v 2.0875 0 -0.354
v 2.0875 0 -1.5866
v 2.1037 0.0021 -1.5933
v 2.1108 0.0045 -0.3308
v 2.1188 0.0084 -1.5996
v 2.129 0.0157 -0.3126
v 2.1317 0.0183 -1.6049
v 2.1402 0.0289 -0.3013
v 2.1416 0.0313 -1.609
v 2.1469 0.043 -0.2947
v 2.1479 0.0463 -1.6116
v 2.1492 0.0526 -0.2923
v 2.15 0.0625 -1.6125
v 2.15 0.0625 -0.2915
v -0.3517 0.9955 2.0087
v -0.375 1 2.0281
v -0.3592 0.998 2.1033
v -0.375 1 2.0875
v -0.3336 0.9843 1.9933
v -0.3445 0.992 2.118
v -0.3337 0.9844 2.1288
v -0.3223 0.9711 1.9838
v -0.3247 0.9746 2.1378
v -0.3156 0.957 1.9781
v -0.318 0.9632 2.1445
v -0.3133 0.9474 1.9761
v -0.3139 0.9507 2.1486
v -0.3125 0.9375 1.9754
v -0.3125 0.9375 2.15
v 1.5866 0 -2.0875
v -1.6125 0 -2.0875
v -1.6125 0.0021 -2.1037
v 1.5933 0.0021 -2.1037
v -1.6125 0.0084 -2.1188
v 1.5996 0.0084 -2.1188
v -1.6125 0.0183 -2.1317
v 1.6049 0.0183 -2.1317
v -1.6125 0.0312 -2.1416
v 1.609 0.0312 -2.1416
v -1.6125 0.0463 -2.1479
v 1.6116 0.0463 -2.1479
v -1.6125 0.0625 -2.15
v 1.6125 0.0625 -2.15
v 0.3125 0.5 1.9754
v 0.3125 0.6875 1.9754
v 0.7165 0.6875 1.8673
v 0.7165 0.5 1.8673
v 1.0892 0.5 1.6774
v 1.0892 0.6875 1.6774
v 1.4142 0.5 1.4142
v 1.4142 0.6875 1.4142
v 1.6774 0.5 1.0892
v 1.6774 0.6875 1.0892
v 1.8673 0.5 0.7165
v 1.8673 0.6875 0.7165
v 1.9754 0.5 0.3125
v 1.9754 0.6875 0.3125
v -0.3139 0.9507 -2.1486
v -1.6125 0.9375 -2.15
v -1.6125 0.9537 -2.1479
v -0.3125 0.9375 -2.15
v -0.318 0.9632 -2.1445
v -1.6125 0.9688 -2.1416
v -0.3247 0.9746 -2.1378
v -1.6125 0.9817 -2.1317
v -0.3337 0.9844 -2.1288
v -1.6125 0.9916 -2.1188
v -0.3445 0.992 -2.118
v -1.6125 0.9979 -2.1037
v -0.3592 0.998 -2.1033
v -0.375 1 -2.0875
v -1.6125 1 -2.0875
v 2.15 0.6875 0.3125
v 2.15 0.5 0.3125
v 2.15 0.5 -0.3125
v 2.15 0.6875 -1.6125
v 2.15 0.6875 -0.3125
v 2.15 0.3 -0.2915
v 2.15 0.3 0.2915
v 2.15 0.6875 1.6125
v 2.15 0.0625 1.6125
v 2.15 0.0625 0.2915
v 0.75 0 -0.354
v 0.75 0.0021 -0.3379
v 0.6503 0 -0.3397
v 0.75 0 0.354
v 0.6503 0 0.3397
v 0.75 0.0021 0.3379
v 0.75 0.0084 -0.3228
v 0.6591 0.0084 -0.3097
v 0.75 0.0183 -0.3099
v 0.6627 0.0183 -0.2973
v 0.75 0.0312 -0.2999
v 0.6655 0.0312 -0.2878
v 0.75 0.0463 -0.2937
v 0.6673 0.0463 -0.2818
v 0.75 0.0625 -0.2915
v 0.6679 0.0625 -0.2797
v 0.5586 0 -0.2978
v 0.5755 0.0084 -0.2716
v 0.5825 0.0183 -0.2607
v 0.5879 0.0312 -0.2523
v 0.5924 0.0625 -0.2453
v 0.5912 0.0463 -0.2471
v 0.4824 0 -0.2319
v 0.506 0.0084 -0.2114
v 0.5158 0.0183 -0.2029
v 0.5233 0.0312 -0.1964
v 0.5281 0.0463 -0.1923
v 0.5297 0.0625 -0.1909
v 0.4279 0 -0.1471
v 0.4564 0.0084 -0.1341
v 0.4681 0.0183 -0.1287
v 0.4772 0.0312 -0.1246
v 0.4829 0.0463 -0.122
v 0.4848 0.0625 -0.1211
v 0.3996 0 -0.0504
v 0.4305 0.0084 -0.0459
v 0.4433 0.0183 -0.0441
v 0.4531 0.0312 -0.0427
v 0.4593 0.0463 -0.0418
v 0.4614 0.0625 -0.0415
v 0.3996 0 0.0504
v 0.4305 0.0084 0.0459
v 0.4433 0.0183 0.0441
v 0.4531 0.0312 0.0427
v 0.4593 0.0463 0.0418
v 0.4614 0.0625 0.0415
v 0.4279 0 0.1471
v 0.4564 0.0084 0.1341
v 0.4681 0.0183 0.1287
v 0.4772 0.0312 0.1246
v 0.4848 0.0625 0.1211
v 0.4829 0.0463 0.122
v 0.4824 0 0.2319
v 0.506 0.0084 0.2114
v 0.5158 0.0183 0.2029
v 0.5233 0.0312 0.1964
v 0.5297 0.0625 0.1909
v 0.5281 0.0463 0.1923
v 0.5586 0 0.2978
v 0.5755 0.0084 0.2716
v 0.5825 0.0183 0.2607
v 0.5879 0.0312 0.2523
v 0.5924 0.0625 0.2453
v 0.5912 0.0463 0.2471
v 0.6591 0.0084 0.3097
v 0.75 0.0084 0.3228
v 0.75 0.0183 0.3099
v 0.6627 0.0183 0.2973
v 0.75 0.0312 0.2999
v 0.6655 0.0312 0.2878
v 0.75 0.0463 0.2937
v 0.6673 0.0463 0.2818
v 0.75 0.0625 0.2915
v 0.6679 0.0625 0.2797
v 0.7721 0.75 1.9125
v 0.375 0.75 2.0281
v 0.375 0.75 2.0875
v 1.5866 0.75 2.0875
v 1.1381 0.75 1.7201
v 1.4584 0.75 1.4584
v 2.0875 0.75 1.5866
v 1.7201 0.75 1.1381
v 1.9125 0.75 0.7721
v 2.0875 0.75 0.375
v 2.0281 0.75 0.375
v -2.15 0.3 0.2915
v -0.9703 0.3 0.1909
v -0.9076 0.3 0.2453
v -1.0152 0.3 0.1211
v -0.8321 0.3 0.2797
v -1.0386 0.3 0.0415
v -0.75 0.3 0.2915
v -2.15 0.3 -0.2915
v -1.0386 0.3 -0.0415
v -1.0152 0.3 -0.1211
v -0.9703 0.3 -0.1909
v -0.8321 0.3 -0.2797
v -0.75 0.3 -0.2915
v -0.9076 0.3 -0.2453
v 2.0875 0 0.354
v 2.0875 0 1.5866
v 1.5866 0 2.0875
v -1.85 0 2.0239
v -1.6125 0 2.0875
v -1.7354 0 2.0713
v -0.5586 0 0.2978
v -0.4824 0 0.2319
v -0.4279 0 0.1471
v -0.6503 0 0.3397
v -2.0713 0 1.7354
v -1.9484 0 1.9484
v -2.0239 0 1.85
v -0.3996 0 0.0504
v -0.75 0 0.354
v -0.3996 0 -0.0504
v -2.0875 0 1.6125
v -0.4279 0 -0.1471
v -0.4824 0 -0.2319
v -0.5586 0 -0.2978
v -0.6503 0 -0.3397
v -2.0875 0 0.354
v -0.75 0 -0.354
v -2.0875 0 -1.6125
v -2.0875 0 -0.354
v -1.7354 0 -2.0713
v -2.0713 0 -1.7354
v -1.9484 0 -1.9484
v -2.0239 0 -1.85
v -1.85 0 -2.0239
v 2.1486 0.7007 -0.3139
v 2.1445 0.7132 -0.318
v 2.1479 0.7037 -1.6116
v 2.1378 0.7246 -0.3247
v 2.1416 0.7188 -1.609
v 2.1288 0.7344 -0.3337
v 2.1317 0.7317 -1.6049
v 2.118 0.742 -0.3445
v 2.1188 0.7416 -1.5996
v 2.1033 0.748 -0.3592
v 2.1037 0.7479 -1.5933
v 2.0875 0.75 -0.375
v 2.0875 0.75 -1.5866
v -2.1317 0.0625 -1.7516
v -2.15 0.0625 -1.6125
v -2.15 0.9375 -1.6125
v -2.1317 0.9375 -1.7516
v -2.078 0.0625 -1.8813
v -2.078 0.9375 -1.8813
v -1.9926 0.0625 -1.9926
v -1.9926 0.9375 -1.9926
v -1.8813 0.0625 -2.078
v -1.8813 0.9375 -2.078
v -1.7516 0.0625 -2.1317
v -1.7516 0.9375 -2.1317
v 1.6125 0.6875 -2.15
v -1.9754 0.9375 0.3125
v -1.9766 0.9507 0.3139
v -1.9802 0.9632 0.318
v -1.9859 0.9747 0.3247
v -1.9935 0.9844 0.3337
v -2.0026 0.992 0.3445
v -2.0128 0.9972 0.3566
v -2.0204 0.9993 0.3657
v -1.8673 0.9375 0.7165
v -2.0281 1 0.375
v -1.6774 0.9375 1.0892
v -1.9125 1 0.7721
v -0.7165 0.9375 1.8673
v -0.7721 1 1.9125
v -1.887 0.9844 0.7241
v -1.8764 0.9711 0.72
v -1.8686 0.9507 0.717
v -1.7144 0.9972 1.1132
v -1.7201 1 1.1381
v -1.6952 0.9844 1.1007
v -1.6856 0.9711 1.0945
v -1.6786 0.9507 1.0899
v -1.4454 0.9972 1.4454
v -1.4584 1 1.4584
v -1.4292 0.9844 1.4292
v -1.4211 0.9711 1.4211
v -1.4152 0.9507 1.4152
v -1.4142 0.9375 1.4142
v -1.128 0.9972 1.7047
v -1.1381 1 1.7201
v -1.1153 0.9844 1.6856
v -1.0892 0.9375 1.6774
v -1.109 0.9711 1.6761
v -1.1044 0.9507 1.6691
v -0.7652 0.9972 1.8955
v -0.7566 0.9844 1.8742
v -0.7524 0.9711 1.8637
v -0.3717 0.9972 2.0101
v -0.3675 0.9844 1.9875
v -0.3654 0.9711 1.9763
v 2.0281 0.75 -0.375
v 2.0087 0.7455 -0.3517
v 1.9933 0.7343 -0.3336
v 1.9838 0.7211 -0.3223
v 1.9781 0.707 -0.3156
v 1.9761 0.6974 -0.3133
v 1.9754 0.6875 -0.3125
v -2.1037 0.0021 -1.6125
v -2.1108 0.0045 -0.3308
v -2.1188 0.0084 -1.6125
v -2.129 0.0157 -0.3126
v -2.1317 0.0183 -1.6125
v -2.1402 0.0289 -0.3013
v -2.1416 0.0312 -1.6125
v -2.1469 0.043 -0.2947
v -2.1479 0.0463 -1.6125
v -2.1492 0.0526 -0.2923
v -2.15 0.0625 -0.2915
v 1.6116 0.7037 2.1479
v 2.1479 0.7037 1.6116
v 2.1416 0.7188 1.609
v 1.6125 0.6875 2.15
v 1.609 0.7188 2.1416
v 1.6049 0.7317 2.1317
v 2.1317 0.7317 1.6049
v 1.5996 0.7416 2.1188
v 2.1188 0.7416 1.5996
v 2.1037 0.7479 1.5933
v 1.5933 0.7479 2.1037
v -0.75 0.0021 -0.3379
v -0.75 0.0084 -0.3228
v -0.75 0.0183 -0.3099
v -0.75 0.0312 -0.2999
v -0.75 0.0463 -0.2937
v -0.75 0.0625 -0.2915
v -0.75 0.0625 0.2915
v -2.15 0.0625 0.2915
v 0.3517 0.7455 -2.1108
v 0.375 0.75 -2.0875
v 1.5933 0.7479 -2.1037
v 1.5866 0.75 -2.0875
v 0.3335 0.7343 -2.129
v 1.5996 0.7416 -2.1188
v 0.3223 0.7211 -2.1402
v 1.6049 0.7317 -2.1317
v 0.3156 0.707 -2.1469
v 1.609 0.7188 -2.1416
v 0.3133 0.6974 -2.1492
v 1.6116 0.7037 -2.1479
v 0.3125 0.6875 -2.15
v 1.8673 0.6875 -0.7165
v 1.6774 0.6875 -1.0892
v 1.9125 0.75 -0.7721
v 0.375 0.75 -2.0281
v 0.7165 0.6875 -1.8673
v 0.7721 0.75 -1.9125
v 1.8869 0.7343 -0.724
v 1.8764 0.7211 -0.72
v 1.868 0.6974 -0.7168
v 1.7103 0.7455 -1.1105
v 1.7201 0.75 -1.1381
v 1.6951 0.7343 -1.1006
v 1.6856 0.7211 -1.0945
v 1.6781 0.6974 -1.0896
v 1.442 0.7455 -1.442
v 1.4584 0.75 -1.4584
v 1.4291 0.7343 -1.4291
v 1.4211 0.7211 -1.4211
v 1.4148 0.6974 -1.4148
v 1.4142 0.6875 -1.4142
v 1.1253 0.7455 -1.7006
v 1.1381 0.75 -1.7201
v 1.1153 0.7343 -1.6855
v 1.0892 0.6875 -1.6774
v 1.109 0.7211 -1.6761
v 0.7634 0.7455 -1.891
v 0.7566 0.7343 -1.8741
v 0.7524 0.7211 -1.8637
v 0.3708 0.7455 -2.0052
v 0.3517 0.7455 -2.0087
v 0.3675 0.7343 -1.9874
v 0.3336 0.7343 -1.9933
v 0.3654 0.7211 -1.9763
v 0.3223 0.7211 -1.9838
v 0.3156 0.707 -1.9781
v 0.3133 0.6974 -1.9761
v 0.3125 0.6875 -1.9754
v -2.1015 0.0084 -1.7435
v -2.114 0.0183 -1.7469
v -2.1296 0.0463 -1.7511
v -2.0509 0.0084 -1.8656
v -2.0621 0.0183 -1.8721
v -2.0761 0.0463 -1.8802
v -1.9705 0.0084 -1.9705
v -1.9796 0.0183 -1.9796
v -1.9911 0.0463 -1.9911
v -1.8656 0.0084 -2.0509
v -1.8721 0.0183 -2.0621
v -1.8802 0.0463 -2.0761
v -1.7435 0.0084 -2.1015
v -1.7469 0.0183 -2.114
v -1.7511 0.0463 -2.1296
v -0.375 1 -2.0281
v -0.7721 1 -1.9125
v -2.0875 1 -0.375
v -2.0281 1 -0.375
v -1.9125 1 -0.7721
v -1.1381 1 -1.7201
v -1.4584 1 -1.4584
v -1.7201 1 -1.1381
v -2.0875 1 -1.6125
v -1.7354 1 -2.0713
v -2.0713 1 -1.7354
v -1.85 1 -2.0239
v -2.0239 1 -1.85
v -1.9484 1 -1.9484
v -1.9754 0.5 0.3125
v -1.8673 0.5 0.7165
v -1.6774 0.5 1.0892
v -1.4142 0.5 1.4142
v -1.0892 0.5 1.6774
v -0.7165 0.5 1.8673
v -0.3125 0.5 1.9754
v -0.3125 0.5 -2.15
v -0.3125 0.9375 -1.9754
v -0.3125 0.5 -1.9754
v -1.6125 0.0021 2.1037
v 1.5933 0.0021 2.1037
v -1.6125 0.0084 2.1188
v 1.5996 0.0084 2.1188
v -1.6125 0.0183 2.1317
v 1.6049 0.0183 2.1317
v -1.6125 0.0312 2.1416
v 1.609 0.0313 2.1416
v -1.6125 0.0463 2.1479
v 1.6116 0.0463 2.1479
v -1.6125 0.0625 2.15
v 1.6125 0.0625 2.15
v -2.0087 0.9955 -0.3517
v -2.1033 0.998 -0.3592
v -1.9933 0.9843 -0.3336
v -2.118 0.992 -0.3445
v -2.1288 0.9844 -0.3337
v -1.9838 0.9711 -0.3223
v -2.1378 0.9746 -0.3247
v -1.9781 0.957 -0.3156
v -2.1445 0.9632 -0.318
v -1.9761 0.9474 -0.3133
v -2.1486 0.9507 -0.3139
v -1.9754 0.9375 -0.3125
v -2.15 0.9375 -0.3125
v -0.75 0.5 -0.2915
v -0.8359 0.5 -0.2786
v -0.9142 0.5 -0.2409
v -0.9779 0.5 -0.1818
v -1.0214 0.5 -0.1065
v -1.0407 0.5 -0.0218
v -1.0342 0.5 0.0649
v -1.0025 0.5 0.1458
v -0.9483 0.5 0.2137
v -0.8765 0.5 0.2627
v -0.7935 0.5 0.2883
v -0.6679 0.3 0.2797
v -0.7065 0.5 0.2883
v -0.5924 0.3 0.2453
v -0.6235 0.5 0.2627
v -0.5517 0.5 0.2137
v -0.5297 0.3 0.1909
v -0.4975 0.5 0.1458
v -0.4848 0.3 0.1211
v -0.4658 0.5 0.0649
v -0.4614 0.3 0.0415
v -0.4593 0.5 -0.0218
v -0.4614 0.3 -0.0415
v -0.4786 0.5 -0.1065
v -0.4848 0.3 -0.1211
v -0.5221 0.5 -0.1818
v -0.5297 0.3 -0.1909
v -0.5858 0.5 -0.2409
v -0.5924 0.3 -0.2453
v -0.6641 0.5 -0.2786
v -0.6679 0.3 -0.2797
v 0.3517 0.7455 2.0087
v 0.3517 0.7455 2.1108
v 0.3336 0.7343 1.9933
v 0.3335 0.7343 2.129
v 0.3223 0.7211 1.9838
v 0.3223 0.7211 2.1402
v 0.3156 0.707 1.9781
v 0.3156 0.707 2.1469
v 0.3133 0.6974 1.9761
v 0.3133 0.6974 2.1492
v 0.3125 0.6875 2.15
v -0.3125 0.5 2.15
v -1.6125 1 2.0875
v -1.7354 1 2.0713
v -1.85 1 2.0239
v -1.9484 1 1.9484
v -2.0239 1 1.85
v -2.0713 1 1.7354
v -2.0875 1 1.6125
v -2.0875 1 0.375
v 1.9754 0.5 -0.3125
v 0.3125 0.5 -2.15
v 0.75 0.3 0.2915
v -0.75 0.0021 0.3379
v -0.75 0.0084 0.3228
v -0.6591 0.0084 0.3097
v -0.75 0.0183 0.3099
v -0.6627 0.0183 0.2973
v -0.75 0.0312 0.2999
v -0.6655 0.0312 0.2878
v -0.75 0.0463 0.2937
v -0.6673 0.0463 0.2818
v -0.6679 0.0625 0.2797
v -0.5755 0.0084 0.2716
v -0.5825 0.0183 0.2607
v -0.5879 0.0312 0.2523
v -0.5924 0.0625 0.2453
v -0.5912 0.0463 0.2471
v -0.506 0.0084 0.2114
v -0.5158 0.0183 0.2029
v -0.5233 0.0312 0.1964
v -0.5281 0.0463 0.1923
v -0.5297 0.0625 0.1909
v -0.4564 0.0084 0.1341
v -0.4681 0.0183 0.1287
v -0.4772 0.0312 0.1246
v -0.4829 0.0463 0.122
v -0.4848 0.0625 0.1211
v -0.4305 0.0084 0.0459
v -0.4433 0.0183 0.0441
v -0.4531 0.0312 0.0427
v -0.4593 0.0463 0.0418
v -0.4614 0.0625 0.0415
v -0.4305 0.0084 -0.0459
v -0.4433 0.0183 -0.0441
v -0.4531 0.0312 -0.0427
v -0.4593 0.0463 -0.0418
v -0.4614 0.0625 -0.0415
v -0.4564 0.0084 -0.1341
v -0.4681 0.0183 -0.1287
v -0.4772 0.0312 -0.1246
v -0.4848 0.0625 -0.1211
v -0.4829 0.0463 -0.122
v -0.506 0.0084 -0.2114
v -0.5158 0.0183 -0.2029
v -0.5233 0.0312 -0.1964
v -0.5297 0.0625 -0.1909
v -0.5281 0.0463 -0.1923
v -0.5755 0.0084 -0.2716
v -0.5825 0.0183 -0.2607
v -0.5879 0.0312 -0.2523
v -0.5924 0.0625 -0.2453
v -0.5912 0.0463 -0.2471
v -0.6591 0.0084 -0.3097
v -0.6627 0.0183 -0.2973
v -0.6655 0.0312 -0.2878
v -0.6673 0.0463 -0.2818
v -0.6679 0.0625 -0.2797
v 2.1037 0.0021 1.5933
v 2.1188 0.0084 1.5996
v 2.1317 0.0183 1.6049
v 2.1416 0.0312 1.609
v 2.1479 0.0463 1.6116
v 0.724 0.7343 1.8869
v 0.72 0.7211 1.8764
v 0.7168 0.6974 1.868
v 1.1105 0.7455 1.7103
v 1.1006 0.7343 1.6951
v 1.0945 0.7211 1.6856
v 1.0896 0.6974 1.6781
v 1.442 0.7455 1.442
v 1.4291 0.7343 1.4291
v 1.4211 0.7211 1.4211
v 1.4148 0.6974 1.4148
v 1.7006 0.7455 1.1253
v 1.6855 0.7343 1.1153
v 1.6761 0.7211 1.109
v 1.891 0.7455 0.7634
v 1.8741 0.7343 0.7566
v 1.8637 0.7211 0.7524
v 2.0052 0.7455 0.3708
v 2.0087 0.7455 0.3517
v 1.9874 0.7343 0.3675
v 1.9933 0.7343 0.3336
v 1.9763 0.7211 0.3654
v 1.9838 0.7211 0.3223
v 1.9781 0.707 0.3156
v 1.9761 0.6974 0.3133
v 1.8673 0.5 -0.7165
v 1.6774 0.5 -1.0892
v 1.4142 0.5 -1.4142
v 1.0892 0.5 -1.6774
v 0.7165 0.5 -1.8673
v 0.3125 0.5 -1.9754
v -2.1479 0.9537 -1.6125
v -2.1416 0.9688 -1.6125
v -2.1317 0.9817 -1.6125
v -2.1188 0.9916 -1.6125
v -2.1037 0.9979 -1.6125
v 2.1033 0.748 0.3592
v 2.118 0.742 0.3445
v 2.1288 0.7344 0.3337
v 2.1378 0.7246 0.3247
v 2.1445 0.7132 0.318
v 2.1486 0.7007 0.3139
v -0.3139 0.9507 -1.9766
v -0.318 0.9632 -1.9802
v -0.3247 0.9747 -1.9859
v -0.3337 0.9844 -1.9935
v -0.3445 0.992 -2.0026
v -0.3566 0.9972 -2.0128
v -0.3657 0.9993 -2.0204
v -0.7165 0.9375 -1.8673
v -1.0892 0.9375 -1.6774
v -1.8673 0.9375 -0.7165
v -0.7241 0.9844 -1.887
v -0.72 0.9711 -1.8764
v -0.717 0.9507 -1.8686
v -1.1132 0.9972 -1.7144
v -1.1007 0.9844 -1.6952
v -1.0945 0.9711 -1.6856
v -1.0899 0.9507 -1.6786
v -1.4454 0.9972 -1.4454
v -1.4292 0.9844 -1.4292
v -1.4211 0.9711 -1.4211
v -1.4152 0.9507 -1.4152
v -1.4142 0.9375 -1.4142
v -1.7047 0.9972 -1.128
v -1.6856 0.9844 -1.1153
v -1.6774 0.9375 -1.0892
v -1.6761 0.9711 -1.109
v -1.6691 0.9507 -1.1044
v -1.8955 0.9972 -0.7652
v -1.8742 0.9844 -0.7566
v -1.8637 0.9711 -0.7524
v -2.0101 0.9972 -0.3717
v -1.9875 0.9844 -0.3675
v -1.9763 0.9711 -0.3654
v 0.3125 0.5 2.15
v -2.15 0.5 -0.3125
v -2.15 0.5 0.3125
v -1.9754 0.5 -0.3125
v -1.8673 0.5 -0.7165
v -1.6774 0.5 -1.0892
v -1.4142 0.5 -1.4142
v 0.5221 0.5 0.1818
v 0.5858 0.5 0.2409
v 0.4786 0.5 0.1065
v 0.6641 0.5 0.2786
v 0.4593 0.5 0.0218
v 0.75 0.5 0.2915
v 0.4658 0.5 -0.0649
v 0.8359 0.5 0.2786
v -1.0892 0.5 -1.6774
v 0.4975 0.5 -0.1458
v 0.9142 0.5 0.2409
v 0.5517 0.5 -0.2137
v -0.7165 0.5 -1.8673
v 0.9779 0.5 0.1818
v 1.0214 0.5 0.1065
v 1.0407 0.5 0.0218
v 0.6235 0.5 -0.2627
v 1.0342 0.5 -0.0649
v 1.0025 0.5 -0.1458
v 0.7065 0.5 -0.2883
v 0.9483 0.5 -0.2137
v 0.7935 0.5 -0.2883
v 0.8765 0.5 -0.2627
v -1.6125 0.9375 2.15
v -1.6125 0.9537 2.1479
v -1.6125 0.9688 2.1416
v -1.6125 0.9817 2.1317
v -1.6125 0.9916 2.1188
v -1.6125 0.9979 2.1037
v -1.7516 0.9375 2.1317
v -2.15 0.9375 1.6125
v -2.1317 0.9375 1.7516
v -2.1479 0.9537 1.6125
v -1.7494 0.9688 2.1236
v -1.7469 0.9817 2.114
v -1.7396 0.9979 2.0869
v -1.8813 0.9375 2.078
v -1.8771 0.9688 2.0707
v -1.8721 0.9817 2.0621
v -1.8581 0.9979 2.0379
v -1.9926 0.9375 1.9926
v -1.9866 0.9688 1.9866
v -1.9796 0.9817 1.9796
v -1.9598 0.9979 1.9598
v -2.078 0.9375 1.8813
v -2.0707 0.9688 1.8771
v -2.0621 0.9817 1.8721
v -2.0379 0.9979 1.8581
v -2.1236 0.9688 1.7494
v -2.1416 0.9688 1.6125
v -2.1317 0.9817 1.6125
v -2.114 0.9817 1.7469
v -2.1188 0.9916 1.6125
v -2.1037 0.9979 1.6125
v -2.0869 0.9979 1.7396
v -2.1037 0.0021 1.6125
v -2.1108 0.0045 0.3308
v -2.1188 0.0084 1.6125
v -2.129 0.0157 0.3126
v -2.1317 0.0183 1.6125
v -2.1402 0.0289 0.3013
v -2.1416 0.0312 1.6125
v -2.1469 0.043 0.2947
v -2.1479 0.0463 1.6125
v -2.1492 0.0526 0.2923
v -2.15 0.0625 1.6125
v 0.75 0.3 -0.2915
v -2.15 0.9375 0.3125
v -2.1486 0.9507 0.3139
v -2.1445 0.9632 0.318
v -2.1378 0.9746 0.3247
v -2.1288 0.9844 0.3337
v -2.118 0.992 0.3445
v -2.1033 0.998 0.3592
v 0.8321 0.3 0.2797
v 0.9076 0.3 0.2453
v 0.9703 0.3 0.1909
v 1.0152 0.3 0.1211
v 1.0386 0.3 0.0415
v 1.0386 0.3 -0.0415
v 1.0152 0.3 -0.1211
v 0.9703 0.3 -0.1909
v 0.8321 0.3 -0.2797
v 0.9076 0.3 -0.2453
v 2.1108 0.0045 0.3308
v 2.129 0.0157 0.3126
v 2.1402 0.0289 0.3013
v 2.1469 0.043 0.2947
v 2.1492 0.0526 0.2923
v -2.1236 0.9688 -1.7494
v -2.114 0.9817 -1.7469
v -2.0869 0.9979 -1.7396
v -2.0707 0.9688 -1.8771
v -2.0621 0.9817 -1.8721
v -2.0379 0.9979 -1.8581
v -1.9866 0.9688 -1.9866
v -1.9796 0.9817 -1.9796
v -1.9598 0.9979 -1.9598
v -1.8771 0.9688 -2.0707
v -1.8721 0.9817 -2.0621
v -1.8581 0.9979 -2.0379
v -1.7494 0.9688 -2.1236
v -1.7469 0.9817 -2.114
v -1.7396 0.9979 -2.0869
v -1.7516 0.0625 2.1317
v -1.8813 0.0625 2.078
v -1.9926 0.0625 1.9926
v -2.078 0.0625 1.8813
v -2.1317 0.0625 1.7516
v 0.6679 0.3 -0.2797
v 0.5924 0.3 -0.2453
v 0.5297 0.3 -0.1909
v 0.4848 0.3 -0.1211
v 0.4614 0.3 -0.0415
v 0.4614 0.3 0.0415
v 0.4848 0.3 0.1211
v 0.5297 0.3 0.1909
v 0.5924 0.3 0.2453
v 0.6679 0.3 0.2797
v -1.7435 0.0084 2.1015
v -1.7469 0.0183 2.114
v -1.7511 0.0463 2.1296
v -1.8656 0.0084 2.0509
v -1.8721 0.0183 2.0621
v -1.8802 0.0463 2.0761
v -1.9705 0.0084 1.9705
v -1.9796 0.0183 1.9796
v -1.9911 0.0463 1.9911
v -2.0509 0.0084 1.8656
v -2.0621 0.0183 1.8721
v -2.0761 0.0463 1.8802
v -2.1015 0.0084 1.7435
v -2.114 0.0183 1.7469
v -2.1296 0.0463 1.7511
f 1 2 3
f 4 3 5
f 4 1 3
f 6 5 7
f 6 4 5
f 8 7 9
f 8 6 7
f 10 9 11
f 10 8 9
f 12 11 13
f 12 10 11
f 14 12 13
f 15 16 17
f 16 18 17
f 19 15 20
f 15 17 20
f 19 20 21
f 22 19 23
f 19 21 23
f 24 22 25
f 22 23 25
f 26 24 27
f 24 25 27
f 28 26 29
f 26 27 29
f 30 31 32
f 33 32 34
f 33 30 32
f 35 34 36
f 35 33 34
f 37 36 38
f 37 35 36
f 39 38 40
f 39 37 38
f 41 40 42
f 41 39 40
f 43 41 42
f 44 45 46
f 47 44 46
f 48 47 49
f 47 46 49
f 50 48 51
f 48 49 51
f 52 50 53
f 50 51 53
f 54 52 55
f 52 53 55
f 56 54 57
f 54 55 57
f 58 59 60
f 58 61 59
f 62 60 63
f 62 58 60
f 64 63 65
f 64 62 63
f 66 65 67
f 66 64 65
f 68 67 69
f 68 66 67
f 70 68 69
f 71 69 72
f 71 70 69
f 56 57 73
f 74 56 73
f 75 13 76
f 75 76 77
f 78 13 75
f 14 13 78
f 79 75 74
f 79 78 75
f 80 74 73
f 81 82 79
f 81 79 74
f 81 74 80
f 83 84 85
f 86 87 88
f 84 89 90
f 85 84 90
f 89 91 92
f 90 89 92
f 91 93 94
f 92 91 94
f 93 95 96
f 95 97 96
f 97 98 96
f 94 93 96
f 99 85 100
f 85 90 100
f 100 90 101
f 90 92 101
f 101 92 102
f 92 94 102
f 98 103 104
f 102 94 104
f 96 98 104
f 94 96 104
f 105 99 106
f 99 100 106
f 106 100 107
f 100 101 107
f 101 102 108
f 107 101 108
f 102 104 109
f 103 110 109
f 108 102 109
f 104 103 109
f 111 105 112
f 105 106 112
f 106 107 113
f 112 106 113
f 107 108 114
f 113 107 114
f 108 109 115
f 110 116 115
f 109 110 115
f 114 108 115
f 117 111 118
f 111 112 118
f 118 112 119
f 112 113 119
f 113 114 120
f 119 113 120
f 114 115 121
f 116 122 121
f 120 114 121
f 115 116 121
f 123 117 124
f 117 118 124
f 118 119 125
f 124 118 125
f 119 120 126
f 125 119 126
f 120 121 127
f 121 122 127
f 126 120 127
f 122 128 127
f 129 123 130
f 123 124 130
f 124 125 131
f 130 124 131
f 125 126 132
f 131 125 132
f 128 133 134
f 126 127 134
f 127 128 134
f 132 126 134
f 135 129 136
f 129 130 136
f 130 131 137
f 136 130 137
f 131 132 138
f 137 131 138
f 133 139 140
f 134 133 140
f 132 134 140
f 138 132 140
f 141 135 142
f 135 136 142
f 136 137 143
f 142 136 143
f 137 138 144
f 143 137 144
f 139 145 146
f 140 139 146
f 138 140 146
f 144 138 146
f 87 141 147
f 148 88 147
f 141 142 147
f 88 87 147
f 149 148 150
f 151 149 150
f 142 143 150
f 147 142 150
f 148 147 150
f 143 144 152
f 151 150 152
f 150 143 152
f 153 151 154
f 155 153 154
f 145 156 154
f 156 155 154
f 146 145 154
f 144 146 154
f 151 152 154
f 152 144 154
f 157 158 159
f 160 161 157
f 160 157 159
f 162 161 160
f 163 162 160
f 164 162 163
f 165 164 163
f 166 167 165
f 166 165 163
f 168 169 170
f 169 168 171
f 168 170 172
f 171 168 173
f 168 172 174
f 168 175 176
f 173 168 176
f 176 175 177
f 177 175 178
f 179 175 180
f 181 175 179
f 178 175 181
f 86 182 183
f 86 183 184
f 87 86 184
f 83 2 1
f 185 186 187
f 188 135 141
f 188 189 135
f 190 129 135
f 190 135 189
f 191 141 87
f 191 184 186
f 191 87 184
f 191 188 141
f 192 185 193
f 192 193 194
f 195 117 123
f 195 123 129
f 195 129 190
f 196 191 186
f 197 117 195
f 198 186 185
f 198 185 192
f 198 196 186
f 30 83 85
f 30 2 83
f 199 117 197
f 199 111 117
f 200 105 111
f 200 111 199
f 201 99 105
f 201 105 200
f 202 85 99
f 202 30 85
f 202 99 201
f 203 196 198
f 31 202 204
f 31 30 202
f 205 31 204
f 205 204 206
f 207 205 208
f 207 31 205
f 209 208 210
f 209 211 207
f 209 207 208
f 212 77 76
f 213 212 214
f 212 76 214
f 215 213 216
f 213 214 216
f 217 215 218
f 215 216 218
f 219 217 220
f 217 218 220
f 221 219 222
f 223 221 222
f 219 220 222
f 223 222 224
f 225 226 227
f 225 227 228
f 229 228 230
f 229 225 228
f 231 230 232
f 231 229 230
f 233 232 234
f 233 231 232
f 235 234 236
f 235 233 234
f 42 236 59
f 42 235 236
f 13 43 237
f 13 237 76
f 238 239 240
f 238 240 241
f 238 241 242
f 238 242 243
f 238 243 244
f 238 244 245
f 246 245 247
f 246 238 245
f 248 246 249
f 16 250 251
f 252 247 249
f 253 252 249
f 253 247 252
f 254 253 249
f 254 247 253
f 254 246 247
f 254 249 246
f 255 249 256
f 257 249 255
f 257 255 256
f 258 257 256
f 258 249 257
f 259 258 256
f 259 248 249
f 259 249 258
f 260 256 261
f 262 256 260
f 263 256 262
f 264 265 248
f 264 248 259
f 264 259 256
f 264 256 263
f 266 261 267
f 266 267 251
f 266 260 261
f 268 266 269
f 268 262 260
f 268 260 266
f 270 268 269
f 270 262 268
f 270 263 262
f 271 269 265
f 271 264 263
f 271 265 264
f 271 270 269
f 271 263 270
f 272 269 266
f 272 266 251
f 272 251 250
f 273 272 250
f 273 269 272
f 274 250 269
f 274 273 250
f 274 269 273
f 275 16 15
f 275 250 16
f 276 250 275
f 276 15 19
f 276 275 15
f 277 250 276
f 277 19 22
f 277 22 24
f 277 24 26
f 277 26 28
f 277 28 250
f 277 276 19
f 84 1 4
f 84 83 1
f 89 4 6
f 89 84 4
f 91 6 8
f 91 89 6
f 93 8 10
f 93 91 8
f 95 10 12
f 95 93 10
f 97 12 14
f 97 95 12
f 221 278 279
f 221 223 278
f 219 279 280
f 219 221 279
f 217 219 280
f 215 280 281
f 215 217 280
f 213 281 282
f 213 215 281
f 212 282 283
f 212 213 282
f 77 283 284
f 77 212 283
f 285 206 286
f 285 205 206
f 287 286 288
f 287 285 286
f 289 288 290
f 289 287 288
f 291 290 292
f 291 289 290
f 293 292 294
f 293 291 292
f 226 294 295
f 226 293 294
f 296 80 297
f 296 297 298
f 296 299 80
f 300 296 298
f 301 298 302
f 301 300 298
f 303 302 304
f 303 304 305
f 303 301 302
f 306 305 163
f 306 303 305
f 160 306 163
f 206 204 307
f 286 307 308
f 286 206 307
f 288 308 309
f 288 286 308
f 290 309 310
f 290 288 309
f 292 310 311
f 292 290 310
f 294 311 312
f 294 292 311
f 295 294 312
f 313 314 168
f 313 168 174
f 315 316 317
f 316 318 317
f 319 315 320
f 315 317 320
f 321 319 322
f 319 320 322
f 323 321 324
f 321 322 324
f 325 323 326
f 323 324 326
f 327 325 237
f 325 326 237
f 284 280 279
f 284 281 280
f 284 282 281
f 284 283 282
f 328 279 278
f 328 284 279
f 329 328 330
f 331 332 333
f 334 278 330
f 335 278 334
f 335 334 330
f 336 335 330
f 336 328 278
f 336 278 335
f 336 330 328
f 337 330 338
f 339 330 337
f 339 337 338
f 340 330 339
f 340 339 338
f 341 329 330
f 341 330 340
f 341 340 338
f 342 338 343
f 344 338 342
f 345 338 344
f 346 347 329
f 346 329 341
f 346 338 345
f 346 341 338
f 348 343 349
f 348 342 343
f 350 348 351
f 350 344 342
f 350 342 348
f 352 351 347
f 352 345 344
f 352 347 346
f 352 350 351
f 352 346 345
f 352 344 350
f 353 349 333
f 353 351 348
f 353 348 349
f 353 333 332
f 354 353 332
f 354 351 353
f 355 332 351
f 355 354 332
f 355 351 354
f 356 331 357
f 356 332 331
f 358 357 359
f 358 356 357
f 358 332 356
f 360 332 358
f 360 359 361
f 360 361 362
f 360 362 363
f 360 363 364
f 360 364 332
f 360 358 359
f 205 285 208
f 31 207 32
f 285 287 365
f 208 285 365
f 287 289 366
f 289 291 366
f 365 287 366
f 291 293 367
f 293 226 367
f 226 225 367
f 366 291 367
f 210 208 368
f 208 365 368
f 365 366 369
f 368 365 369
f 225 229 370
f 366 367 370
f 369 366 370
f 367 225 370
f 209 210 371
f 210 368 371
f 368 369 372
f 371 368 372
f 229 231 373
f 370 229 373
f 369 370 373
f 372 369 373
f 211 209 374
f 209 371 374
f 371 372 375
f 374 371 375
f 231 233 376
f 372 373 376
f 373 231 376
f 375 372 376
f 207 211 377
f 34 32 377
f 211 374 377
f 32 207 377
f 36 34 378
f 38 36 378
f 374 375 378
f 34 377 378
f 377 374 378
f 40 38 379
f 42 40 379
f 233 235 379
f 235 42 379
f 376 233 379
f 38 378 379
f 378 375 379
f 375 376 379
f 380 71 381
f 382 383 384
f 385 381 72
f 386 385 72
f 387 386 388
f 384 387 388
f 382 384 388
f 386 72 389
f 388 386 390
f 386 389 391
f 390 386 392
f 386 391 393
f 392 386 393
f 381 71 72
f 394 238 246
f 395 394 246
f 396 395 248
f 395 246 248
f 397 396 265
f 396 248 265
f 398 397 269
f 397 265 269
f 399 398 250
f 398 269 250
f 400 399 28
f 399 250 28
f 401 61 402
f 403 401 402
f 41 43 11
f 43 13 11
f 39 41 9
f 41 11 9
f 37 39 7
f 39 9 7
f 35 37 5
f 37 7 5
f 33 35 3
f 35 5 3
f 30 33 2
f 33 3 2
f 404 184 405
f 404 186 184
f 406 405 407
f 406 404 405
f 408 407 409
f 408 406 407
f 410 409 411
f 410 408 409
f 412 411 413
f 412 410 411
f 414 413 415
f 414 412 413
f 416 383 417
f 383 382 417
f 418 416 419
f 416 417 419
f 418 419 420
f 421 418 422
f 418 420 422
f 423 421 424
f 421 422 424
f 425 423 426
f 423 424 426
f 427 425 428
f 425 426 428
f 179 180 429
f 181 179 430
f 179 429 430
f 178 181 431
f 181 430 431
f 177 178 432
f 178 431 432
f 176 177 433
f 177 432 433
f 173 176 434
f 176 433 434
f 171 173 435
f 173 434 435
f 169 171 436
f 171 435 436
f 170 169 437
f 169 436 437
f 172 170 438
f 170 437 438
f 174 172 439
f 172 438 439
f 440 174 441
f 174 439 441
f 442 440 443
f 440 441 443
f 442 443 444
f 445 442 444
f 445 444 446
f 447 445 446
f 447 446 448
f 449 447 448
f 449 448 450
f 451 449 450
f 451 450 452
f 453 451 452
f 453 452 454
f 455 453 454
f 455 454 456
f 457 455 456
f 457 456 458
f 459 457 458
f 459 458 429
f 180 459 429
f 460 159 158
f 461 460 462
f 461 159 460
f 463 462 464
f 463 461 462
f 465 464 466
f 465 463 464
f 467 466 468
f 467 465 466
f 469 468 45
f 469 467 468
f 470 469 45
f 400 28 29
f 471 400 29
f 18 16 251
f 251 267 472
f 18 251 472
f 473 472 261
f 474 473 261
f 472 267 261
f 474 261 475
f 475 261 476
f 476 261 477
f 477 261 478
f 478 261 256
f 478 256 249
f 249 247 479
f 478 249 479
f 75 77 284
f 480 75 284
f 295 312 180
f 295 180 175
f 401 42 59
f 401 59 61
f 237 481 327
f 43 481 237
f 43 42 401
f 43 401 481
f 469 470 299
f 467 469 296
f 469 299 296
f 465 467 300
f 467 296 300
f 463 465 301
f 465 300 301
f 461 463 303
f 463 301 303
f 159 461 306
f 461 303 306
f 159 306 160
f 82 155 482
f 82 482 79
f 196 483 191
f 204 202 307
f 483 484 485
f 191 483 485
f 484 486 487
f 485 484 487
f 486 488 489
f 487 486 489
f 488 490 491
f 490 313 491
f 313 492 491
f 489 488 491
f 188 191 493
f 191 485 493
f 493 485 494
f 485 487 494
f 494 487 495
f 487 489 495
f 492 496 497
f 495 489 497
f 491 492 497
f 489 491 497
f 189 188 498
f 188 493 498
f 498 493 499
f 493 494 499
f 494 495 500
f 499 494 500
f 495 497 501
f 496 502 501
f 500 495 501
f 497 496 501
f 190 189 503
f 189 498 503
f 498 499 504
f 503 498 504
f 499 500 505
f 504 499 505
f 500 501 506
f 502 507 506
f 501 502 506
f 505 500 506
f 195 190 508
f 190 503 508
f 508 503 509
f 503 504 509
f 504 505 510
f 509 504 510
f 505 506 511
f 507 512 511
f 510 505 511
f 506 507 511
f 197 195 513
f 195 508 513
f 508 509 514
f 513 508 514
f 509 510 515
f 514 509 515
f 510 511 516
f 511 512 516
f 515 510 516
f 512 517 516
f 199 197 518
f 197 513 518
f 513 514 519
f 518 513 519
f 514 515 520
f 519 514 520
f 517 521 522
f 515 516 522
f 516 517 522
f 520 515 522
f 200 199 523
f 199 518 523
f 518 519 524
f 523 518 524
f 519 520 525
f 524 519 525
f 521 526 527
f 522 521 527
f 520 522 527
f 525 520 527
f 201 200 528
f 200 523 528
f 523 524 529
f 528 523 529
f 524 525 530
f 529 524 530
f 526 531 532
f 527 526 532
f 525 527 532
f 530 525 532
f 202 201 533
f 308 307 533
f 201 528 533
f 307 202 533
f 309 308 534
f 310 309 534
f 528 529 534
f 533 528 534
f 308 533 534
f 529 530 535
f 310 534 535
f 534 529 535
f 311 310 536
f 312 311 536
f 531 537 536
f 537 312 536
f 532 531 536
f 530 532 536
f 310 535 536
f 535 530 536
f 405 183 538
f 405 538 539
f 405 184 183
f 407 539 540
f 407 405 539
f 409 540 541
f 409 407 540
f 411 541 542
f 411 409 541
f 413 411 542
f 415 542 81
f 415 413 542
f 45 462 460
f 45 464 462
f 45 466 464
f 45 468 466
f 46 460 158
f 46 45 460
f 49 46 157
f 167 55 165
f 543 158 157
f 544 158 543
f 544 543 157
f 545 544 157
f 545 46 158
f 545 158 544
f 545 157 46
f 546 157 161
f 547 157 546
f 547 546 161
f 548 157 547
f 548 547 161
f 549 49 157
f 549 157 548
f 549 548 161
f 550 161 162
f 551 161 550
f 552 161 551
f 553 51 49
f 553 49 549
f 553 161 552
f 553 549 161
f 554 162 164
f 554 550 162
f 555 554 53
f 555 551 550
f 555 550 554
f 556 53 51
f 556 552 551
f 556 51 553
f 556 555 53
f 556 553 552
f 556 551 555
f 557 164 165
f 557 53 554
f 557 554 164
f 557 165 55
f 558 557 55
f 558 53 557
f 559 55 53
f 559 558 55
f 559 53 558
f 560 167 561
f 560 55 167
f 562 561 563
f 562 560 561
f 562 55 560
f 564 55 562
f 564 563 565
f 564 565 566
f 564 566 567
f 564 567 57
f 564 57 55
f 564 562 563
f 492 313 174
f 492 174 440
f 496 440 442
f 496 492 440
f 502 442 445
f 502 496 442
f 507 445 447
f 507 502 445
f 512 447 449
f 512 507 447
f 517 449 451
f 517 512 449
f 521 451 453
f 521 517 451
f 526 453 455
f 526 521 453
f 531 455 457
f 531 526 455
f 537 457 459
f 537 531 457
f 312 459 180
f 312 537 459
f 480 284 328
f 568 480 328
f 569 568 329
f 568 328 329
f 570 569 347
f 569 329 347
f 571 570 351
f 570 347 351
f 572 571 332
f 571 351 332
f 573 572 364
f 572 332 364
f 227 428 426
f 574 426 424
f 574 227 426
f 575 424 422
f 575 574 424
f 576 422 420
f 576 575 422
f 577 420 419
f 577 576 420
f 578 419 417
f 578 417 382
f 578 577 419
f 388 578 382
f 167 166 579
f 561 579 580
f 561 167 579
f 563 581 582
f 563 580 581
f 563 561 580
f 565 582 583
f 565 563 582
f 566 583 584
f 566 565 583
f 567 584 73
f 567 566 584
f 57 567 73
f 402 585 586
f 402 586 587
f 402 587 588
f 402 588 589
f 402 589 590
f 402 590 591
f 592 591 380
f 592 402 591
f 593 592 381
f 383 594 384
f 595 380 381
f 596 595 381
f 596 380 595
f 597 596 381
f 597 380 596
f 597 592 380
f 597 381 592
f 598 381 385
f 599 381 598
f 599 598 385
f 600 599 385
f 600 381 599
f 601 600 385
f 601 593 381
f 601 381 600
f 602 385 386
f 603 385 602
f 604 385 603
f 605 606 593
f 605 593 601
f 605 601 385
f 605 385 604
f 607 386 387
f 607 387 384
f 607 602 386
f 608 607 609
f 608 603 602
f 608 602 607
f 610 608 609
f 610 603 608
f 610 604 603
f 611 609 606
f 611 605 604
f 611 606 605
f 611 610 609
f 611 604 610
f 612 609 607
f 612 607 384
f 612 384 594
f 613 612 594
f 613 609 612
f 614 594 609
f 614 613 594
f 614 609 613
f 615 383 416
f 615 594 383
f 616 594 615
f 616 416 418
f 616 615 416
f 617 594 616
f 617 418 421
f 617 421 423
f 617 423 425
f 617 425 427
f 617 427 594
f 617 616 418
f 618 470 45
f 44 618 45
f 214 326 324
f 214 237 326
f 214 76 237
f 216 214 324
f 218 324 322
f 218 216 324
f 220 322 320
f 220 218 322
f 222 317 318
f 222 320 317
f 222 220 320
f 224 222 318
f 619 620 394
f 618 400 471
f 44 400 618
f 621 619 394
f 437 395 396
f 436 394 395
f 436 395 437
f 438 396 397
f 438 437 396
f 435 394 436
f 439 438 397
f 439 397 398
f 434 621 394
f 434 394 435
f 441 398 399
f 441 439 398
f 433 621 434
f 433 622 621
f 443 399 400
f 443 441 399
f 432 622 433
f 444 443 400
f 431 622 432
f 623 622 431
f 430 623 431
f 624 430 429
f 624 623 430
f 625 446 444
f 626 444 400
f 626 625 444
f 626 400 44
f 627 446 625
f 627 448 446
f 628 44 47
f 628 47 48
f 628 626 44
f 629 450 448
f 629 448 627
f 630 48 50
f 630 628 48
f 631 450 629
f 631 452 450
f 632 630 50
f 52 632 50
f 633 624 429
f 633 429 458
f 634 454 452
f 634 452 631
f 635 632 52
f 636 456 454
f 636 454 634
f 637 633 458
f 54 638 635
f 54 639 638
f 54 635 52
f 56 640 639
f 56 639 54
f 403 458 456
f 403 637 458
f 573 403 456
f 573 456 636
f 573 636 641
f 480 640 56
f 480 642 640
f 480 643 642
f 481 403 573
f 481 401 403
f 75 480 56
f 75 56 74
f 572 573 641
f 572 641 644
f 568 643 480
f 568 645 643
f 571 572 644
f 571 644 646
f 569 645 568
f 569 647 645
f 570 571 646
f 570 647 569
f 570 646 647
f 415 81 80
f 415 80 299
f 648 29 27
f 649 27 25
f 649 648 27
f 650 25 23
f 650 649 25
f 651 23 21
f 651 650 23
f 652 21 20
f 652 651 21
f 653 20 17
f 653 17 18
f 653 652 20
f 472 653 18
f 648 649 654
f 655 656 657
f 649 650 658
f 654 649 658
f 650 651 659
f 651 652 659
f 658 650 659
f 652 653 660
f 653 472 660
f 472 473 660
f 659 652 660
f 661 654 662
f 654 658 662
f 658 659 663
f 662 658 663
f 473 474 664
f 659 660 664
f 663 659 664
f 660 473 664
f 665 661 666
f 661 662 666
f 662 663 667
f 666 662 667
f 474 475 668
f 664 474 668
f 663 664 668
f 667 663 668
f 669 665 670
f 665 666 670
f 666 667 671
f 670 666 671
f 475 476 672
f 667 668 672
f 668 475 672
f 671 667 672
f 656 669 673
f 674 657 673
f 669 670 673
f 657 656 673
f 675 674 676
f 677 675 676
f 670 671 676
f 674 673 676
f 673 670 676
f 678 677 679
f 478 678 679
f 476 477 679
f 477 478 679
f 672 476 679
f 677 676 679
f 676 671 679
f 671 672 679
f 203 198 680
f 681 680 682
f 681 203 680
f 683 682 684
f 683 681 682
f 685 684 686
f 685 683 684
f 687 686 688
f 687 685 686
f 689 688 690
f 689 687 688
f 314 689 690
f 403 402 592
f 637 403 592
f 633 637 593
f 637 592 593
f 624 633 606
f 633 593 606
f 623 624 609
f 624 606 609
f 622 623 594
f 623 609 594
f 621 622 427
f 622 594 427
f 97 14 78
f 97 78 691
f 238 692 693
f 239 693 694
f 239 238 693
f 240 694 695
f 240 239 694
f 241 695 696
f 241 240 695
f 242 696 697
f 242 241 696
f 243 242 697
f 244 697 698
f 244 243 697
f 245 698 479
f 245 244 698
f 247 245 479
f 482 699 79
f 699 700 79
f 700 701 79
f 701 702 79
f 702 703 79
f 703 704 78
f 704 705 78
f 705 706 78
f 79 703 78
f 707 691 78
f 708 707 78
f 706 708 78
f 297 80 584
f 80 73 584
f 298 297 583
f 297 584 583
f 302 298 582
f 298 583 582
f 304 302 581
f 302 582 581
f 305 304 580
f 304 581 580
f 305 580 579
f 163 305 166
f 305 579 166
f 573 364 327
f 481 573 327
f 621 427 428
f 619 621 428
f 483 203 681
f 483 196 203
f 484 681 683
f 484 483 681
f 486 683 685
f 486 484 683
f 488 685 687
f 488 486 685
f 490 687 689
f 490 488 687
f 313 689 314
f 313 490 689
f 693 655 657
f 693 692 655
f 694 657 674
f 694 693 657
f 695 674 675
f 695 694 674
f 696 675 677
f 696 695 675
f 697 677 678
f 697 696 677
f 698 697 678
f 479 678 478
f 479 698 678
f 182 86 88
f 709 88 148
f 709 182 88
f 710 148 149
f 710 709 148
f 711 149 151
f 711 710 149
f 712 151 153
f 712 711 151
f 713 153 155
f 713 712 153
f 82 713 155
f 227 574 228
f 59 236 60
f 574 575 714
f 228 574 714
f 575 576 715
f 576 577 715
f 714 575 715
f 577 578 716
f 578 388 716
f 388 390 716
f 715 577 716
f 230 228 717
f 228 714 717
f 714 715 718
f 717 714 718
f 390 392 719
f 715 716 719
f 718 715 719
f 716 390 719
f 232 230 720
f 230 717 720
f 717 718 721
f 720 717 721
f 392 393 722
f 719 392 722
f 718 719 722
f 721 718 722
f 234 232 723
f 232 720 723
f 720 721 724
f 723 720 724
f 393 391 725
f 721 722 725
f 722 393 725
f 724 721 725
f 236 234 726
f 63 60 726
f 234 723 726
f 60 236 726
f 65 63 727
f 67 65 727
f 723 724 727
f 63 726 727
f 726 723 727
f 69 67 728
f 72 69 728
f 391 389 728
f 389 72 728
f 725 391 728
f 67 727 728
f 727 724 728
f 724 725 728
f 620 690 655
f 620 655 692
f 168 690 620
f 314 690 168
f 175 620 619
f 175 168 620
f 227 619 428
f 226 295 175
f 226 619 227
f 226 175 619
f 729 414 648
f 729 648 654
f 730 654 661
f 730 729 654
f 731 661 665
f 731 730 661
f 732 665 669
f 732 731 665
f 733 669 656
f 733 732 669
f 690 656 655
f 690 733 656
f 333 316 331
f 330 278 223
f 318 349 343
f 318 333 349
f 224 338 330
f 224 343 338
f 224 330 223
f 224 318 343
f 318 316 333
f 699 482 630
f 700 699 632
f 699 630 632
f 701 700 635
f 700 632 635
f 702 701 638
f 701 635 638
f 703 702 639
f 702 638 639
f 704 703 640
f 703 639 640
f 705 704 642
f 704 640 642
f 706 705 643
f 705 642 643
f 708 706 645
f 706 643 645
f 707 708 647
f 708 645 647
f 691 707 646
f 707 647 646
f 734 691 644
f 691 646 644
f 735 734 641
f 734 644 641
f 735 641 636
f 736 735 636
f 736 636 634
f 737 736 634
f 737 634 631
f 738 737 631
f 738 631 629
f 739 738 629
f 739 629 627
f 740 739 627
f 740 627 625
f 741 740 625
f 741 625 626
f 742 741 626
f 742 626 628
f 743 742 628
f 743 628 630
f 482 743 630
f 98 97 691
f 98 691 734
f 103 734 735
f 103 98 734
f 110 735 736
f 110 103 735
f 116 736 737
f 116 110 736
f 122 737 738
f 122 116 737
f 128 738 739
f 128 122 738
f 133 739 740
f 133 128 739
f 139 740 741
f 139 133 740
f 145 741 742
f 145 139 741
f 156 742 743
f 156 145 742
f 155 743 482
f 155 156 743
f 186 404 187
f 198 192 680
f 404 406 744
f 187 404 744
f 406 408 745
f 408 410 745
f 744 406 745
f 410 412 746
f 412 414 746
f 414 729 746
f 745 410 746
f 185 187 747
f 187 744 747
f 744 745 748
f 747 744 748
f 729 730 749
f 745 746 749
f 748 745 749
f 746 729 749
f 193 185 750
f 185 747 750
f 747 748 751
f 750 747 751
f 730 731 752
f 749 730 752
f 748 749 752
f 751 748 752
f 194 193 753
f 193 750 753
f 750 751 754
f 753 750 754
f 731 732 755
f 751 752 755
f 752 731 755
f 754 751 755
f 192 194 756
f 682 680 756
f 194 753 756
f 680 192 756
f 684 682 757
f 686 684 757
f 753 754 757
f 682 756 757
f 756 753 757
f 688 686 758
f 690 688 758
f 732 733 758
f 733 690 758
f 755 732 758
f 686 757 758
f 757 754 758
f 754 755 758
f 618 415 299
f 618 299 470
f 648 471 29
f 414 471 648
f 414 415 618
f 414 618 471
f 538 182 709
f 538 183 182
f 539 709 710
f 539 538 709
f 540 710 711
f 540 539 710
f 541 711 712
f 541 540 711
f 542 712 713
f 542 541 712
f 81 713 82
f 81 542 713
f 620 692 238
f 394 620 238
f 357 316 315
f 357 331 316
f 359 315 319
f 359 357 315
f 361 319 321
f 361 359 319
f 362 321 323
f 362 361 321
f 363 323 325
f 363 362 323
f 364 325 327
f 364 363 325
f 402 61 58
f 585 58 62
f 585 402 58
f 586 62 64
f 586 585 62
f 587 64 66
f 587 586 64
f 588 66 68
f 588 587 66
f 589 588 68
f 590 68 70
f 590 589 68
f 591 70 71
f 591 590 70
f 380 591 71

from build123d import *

# Parameters (mm, degrees)
SALIENTE_EXTRUIR1_DEPTH = 1
CORTAR_EXTRUIR1_DEPTH   = 0.5
CROQUIS4_W              = 2.15
CROQUIS4_H              = 4.3
CORTAR_EXTRUIR2_DEPTH   = 0.25
CORTAR_EXTRUIR3_DEPTH   = 0.3
CROQUIS6_R              = 0.291547595
CORTAR_EXTRUIR4_DEPTH   = 4.081395788
REDONDEO1_R             = 0.0625


with BuildPart() as part:
    # Croquis2 → Saliente-Extruir1 (new body)
    with BuildSketch(Plane(origin=(0, 0, 0), x_dir=(1, 0, 0), z_dir=(0, 1, 0))):
        with BuildLine():
            Line((1.6125, 2.15), (2.15, 1.6125))
            Line((2.15, 1.6125), (2.15, -1.6125))
            Line((2.15, -1.6125), (1.6125, -2.15))
            Line((1.6125, -2.15), (-1.6125, -2.15))
            ThreePointArc((-1.6125, -2.15), (-1.992569895, -1.992569895), (-2.15, -1.6125))
            Line((-2.15, -1.6125), (-2.15, 1.6125))
            ThreePointArc((-2.15, 1.6125), (-1.992569895, 1.992569895), (-1.6125, 2.15))
            Line((-1.6125, 2.15), (1.6125, 2.15))
        make_face()
    extrude(amount=SALIENTE_EXTRUIR1_DEPTH)

    # Croquis3 → Cortar-Extruir1 (cut)
    with BuildSketch(Plane(origin=(0, 1, 0), x_dir=(1, 0, 0), z_dir=(0, 1, 0))):
        with BuildLine():
            ThreePointArc((-0.3125, 1.975435079), (-1.414213562, 1.414213562), (-1.975435079, 0.3125))
            Line((-1.975435079, 0.3125), (-2.15, 0.3125))
            Line((-2.15, 0.3125), (-2.15, -0.3125))
            Line((-2.15, -0.3125), (-1.975435079, -0.3125))
            ThreePointArc((-1.975435079, -0.3125), (-1.414213562, -1.414213562), (-0.3125, -1.975435079))
            Line((-0.3125, -1.975435079), (-0.3125, -2.15))
            Line((-0.3125, -2.15), (0.3125, -2.15))
            Line((0.3125, -2.15), (0.3125, -1.975435079))
            ThreePointArc((0.3125, -1.975435079), (1.414213562, -1.414213562), (1.975435079, -0.3125))
            Line((1.975435079, -0.3125), (2.15, -0.3125))
            Line((2.15, -0.3125), (2.15, 0.3125))
            Line((2.15, 0.3125), (1.975435079, 0.3125))
            ThreePointArc((1.975435079, 0.3125), (1.414213562, 1.414213562), (0.3125, 1.975435079))
            Line((0.3125, 1.975435079), (0.3125, 2.15))
            Line((0.3125, 2.15), (-0.3125, 2.15))
            Line((-0.3125, 2.15), (-0.3125, 1.975435079))
        make_face()
    extrude(amount=-CORTAR_EXTRUIR1_DEPTH, mode=Mode.SUBTRACT)

    # Croquis4 → Cortar-Extruir2 (cut)
    with BuildSketch(Plane(origin=(0, 1, 0), x_dir=(1, 0, 0), z_dir=(0, 1, 0))):
        with Locations((1.075, 0)):
            Rectangle(CROQUIS4_W, CROQUIS4_H)
    extrude(amount=-CORTAR_EXTRUIR2_DEPTH, mode=Mode.SUBTRACT)

    # Croquis5 → Cortar-Extruir3 (cut)
    with BuildSketch(Plane(origin=(0, 0, 0), x_dir=(-1, 0, 0), z_dir=(0, -1, 0))):
        with BuildLine():
            Line((2.15, -0.291547595), (0.75, -0.291547595))
            ThreePointArc((0.75, -0.291547595), (0.458452405, 0), (0.75, 0.291547595))
            Line((0.75, 0.291547595), (2.15, 0.291547595))
            Line((2.15, 0.291547595), (2.15, -0.291547595))
        make_face()
        with BuildLine():
            Line((-2.15, -0.291547595), (-2.15, 0.291547595))
            Line((-2.15, 0.291547595), (-0.75, 0.291547595))
            ThreePointArc((-0.75, 0.291547595), (-0.458452405, 0), (-0.75, -0.291547595))
            Line((-0.75, -0.291547595), (-2.15, -0.291547595))
        make_face()
    extrude(amount=-CORTAR_EXTRUIR3_DEPTH, mode=Mode.SUBTRACT)

    # Croquis6 → Cortar-Extruir4 (cut, through all)
    with BuildSketch(Plane(origin=(0, 0.5, 0), x_dir=(1, 0, 0), z_dir=(0, 1, 0))):
        with Locations(Location((0.75, 0, 0), (0, 0, 270))):
            Circle(CROQUIS6_R)
        with Locations(Location((-0.75, 0, 0), (0, 0, 90))):
            Circle(CROQUIS6_R)
    extrude(amount=-CORTAR_EXTRUIR4_DEPTH, mode=Mode.SUBTRACT)

    # Redondeo1
    redondeo1_edges = [part.edges().sort_by_distance(p)[0] for p in [
        (-2.15, 1, -0.9625),
        (-1.992569895, 0, -1.992569895),
        (0, 0, -2.15),
        (2.15, 0, -0.952023797),
        (-2.15, 0, 0.952023797),
        (-1.45, 0, -0.291547595),
        (-0.458452405, 0, 0),
        (-1.45, 0, 0.291547595),
        (-1.992569895, 1, 1.992569895),
        (1.45, 0, 0.291547595),
        (0.458452405, 0, 0),
        (1.45, 0, -0.291547595),
        (-0.9625, 1, 2.15),
        (-0.9625, 1, -2.15),
        (-2.15, 1, 0.9625),
        (-0.3125, 1, -2.062717539),
        (-2.062717539, 1, 0.3125),
        (-1.414213562, 1, -1.414213562),
        (-2.062717539, 1, -0.3125),
        (-1.414213562, 1, 1.414213562),
        (-0.3125, 1, 2.062717539),
        (-1.992569895, 1, -1.992569895),
        (0.3125, 0.75, 2.062717539),
        (1.88125, 0, -1.88125),
        (2.15, 0, 0.952023797),
        (1.88125, 0, 1.88125),
        (0.9625, 0.75, -2.15),
        (2.15, 0.75, 0.9625),
        (2.15, 0.75, -0.9625),
        (0.9625, 0.75, 2.15),
        (1.88125, 0.75, 1.88125),
        (1.414213562, 0.75, 1.414213562),
        (2.062717539, 0.75, 0.3125),
        (1.88125, 0.75, -1.88125),
        (1.414213562, 0.75, -1.414213562),
        (0.3125, 0.75, -2.062717539),
        (0, 0, 2.15),
        (-1.992569895, 0, 1.992569895),
        (2.062717539, 0.75, -0.3125),
        (-2.15, 0, -0.952023797),
    ]]
    fillet(redondeo1_edges, radius=REDONDEO1_R)


solid = part.part
